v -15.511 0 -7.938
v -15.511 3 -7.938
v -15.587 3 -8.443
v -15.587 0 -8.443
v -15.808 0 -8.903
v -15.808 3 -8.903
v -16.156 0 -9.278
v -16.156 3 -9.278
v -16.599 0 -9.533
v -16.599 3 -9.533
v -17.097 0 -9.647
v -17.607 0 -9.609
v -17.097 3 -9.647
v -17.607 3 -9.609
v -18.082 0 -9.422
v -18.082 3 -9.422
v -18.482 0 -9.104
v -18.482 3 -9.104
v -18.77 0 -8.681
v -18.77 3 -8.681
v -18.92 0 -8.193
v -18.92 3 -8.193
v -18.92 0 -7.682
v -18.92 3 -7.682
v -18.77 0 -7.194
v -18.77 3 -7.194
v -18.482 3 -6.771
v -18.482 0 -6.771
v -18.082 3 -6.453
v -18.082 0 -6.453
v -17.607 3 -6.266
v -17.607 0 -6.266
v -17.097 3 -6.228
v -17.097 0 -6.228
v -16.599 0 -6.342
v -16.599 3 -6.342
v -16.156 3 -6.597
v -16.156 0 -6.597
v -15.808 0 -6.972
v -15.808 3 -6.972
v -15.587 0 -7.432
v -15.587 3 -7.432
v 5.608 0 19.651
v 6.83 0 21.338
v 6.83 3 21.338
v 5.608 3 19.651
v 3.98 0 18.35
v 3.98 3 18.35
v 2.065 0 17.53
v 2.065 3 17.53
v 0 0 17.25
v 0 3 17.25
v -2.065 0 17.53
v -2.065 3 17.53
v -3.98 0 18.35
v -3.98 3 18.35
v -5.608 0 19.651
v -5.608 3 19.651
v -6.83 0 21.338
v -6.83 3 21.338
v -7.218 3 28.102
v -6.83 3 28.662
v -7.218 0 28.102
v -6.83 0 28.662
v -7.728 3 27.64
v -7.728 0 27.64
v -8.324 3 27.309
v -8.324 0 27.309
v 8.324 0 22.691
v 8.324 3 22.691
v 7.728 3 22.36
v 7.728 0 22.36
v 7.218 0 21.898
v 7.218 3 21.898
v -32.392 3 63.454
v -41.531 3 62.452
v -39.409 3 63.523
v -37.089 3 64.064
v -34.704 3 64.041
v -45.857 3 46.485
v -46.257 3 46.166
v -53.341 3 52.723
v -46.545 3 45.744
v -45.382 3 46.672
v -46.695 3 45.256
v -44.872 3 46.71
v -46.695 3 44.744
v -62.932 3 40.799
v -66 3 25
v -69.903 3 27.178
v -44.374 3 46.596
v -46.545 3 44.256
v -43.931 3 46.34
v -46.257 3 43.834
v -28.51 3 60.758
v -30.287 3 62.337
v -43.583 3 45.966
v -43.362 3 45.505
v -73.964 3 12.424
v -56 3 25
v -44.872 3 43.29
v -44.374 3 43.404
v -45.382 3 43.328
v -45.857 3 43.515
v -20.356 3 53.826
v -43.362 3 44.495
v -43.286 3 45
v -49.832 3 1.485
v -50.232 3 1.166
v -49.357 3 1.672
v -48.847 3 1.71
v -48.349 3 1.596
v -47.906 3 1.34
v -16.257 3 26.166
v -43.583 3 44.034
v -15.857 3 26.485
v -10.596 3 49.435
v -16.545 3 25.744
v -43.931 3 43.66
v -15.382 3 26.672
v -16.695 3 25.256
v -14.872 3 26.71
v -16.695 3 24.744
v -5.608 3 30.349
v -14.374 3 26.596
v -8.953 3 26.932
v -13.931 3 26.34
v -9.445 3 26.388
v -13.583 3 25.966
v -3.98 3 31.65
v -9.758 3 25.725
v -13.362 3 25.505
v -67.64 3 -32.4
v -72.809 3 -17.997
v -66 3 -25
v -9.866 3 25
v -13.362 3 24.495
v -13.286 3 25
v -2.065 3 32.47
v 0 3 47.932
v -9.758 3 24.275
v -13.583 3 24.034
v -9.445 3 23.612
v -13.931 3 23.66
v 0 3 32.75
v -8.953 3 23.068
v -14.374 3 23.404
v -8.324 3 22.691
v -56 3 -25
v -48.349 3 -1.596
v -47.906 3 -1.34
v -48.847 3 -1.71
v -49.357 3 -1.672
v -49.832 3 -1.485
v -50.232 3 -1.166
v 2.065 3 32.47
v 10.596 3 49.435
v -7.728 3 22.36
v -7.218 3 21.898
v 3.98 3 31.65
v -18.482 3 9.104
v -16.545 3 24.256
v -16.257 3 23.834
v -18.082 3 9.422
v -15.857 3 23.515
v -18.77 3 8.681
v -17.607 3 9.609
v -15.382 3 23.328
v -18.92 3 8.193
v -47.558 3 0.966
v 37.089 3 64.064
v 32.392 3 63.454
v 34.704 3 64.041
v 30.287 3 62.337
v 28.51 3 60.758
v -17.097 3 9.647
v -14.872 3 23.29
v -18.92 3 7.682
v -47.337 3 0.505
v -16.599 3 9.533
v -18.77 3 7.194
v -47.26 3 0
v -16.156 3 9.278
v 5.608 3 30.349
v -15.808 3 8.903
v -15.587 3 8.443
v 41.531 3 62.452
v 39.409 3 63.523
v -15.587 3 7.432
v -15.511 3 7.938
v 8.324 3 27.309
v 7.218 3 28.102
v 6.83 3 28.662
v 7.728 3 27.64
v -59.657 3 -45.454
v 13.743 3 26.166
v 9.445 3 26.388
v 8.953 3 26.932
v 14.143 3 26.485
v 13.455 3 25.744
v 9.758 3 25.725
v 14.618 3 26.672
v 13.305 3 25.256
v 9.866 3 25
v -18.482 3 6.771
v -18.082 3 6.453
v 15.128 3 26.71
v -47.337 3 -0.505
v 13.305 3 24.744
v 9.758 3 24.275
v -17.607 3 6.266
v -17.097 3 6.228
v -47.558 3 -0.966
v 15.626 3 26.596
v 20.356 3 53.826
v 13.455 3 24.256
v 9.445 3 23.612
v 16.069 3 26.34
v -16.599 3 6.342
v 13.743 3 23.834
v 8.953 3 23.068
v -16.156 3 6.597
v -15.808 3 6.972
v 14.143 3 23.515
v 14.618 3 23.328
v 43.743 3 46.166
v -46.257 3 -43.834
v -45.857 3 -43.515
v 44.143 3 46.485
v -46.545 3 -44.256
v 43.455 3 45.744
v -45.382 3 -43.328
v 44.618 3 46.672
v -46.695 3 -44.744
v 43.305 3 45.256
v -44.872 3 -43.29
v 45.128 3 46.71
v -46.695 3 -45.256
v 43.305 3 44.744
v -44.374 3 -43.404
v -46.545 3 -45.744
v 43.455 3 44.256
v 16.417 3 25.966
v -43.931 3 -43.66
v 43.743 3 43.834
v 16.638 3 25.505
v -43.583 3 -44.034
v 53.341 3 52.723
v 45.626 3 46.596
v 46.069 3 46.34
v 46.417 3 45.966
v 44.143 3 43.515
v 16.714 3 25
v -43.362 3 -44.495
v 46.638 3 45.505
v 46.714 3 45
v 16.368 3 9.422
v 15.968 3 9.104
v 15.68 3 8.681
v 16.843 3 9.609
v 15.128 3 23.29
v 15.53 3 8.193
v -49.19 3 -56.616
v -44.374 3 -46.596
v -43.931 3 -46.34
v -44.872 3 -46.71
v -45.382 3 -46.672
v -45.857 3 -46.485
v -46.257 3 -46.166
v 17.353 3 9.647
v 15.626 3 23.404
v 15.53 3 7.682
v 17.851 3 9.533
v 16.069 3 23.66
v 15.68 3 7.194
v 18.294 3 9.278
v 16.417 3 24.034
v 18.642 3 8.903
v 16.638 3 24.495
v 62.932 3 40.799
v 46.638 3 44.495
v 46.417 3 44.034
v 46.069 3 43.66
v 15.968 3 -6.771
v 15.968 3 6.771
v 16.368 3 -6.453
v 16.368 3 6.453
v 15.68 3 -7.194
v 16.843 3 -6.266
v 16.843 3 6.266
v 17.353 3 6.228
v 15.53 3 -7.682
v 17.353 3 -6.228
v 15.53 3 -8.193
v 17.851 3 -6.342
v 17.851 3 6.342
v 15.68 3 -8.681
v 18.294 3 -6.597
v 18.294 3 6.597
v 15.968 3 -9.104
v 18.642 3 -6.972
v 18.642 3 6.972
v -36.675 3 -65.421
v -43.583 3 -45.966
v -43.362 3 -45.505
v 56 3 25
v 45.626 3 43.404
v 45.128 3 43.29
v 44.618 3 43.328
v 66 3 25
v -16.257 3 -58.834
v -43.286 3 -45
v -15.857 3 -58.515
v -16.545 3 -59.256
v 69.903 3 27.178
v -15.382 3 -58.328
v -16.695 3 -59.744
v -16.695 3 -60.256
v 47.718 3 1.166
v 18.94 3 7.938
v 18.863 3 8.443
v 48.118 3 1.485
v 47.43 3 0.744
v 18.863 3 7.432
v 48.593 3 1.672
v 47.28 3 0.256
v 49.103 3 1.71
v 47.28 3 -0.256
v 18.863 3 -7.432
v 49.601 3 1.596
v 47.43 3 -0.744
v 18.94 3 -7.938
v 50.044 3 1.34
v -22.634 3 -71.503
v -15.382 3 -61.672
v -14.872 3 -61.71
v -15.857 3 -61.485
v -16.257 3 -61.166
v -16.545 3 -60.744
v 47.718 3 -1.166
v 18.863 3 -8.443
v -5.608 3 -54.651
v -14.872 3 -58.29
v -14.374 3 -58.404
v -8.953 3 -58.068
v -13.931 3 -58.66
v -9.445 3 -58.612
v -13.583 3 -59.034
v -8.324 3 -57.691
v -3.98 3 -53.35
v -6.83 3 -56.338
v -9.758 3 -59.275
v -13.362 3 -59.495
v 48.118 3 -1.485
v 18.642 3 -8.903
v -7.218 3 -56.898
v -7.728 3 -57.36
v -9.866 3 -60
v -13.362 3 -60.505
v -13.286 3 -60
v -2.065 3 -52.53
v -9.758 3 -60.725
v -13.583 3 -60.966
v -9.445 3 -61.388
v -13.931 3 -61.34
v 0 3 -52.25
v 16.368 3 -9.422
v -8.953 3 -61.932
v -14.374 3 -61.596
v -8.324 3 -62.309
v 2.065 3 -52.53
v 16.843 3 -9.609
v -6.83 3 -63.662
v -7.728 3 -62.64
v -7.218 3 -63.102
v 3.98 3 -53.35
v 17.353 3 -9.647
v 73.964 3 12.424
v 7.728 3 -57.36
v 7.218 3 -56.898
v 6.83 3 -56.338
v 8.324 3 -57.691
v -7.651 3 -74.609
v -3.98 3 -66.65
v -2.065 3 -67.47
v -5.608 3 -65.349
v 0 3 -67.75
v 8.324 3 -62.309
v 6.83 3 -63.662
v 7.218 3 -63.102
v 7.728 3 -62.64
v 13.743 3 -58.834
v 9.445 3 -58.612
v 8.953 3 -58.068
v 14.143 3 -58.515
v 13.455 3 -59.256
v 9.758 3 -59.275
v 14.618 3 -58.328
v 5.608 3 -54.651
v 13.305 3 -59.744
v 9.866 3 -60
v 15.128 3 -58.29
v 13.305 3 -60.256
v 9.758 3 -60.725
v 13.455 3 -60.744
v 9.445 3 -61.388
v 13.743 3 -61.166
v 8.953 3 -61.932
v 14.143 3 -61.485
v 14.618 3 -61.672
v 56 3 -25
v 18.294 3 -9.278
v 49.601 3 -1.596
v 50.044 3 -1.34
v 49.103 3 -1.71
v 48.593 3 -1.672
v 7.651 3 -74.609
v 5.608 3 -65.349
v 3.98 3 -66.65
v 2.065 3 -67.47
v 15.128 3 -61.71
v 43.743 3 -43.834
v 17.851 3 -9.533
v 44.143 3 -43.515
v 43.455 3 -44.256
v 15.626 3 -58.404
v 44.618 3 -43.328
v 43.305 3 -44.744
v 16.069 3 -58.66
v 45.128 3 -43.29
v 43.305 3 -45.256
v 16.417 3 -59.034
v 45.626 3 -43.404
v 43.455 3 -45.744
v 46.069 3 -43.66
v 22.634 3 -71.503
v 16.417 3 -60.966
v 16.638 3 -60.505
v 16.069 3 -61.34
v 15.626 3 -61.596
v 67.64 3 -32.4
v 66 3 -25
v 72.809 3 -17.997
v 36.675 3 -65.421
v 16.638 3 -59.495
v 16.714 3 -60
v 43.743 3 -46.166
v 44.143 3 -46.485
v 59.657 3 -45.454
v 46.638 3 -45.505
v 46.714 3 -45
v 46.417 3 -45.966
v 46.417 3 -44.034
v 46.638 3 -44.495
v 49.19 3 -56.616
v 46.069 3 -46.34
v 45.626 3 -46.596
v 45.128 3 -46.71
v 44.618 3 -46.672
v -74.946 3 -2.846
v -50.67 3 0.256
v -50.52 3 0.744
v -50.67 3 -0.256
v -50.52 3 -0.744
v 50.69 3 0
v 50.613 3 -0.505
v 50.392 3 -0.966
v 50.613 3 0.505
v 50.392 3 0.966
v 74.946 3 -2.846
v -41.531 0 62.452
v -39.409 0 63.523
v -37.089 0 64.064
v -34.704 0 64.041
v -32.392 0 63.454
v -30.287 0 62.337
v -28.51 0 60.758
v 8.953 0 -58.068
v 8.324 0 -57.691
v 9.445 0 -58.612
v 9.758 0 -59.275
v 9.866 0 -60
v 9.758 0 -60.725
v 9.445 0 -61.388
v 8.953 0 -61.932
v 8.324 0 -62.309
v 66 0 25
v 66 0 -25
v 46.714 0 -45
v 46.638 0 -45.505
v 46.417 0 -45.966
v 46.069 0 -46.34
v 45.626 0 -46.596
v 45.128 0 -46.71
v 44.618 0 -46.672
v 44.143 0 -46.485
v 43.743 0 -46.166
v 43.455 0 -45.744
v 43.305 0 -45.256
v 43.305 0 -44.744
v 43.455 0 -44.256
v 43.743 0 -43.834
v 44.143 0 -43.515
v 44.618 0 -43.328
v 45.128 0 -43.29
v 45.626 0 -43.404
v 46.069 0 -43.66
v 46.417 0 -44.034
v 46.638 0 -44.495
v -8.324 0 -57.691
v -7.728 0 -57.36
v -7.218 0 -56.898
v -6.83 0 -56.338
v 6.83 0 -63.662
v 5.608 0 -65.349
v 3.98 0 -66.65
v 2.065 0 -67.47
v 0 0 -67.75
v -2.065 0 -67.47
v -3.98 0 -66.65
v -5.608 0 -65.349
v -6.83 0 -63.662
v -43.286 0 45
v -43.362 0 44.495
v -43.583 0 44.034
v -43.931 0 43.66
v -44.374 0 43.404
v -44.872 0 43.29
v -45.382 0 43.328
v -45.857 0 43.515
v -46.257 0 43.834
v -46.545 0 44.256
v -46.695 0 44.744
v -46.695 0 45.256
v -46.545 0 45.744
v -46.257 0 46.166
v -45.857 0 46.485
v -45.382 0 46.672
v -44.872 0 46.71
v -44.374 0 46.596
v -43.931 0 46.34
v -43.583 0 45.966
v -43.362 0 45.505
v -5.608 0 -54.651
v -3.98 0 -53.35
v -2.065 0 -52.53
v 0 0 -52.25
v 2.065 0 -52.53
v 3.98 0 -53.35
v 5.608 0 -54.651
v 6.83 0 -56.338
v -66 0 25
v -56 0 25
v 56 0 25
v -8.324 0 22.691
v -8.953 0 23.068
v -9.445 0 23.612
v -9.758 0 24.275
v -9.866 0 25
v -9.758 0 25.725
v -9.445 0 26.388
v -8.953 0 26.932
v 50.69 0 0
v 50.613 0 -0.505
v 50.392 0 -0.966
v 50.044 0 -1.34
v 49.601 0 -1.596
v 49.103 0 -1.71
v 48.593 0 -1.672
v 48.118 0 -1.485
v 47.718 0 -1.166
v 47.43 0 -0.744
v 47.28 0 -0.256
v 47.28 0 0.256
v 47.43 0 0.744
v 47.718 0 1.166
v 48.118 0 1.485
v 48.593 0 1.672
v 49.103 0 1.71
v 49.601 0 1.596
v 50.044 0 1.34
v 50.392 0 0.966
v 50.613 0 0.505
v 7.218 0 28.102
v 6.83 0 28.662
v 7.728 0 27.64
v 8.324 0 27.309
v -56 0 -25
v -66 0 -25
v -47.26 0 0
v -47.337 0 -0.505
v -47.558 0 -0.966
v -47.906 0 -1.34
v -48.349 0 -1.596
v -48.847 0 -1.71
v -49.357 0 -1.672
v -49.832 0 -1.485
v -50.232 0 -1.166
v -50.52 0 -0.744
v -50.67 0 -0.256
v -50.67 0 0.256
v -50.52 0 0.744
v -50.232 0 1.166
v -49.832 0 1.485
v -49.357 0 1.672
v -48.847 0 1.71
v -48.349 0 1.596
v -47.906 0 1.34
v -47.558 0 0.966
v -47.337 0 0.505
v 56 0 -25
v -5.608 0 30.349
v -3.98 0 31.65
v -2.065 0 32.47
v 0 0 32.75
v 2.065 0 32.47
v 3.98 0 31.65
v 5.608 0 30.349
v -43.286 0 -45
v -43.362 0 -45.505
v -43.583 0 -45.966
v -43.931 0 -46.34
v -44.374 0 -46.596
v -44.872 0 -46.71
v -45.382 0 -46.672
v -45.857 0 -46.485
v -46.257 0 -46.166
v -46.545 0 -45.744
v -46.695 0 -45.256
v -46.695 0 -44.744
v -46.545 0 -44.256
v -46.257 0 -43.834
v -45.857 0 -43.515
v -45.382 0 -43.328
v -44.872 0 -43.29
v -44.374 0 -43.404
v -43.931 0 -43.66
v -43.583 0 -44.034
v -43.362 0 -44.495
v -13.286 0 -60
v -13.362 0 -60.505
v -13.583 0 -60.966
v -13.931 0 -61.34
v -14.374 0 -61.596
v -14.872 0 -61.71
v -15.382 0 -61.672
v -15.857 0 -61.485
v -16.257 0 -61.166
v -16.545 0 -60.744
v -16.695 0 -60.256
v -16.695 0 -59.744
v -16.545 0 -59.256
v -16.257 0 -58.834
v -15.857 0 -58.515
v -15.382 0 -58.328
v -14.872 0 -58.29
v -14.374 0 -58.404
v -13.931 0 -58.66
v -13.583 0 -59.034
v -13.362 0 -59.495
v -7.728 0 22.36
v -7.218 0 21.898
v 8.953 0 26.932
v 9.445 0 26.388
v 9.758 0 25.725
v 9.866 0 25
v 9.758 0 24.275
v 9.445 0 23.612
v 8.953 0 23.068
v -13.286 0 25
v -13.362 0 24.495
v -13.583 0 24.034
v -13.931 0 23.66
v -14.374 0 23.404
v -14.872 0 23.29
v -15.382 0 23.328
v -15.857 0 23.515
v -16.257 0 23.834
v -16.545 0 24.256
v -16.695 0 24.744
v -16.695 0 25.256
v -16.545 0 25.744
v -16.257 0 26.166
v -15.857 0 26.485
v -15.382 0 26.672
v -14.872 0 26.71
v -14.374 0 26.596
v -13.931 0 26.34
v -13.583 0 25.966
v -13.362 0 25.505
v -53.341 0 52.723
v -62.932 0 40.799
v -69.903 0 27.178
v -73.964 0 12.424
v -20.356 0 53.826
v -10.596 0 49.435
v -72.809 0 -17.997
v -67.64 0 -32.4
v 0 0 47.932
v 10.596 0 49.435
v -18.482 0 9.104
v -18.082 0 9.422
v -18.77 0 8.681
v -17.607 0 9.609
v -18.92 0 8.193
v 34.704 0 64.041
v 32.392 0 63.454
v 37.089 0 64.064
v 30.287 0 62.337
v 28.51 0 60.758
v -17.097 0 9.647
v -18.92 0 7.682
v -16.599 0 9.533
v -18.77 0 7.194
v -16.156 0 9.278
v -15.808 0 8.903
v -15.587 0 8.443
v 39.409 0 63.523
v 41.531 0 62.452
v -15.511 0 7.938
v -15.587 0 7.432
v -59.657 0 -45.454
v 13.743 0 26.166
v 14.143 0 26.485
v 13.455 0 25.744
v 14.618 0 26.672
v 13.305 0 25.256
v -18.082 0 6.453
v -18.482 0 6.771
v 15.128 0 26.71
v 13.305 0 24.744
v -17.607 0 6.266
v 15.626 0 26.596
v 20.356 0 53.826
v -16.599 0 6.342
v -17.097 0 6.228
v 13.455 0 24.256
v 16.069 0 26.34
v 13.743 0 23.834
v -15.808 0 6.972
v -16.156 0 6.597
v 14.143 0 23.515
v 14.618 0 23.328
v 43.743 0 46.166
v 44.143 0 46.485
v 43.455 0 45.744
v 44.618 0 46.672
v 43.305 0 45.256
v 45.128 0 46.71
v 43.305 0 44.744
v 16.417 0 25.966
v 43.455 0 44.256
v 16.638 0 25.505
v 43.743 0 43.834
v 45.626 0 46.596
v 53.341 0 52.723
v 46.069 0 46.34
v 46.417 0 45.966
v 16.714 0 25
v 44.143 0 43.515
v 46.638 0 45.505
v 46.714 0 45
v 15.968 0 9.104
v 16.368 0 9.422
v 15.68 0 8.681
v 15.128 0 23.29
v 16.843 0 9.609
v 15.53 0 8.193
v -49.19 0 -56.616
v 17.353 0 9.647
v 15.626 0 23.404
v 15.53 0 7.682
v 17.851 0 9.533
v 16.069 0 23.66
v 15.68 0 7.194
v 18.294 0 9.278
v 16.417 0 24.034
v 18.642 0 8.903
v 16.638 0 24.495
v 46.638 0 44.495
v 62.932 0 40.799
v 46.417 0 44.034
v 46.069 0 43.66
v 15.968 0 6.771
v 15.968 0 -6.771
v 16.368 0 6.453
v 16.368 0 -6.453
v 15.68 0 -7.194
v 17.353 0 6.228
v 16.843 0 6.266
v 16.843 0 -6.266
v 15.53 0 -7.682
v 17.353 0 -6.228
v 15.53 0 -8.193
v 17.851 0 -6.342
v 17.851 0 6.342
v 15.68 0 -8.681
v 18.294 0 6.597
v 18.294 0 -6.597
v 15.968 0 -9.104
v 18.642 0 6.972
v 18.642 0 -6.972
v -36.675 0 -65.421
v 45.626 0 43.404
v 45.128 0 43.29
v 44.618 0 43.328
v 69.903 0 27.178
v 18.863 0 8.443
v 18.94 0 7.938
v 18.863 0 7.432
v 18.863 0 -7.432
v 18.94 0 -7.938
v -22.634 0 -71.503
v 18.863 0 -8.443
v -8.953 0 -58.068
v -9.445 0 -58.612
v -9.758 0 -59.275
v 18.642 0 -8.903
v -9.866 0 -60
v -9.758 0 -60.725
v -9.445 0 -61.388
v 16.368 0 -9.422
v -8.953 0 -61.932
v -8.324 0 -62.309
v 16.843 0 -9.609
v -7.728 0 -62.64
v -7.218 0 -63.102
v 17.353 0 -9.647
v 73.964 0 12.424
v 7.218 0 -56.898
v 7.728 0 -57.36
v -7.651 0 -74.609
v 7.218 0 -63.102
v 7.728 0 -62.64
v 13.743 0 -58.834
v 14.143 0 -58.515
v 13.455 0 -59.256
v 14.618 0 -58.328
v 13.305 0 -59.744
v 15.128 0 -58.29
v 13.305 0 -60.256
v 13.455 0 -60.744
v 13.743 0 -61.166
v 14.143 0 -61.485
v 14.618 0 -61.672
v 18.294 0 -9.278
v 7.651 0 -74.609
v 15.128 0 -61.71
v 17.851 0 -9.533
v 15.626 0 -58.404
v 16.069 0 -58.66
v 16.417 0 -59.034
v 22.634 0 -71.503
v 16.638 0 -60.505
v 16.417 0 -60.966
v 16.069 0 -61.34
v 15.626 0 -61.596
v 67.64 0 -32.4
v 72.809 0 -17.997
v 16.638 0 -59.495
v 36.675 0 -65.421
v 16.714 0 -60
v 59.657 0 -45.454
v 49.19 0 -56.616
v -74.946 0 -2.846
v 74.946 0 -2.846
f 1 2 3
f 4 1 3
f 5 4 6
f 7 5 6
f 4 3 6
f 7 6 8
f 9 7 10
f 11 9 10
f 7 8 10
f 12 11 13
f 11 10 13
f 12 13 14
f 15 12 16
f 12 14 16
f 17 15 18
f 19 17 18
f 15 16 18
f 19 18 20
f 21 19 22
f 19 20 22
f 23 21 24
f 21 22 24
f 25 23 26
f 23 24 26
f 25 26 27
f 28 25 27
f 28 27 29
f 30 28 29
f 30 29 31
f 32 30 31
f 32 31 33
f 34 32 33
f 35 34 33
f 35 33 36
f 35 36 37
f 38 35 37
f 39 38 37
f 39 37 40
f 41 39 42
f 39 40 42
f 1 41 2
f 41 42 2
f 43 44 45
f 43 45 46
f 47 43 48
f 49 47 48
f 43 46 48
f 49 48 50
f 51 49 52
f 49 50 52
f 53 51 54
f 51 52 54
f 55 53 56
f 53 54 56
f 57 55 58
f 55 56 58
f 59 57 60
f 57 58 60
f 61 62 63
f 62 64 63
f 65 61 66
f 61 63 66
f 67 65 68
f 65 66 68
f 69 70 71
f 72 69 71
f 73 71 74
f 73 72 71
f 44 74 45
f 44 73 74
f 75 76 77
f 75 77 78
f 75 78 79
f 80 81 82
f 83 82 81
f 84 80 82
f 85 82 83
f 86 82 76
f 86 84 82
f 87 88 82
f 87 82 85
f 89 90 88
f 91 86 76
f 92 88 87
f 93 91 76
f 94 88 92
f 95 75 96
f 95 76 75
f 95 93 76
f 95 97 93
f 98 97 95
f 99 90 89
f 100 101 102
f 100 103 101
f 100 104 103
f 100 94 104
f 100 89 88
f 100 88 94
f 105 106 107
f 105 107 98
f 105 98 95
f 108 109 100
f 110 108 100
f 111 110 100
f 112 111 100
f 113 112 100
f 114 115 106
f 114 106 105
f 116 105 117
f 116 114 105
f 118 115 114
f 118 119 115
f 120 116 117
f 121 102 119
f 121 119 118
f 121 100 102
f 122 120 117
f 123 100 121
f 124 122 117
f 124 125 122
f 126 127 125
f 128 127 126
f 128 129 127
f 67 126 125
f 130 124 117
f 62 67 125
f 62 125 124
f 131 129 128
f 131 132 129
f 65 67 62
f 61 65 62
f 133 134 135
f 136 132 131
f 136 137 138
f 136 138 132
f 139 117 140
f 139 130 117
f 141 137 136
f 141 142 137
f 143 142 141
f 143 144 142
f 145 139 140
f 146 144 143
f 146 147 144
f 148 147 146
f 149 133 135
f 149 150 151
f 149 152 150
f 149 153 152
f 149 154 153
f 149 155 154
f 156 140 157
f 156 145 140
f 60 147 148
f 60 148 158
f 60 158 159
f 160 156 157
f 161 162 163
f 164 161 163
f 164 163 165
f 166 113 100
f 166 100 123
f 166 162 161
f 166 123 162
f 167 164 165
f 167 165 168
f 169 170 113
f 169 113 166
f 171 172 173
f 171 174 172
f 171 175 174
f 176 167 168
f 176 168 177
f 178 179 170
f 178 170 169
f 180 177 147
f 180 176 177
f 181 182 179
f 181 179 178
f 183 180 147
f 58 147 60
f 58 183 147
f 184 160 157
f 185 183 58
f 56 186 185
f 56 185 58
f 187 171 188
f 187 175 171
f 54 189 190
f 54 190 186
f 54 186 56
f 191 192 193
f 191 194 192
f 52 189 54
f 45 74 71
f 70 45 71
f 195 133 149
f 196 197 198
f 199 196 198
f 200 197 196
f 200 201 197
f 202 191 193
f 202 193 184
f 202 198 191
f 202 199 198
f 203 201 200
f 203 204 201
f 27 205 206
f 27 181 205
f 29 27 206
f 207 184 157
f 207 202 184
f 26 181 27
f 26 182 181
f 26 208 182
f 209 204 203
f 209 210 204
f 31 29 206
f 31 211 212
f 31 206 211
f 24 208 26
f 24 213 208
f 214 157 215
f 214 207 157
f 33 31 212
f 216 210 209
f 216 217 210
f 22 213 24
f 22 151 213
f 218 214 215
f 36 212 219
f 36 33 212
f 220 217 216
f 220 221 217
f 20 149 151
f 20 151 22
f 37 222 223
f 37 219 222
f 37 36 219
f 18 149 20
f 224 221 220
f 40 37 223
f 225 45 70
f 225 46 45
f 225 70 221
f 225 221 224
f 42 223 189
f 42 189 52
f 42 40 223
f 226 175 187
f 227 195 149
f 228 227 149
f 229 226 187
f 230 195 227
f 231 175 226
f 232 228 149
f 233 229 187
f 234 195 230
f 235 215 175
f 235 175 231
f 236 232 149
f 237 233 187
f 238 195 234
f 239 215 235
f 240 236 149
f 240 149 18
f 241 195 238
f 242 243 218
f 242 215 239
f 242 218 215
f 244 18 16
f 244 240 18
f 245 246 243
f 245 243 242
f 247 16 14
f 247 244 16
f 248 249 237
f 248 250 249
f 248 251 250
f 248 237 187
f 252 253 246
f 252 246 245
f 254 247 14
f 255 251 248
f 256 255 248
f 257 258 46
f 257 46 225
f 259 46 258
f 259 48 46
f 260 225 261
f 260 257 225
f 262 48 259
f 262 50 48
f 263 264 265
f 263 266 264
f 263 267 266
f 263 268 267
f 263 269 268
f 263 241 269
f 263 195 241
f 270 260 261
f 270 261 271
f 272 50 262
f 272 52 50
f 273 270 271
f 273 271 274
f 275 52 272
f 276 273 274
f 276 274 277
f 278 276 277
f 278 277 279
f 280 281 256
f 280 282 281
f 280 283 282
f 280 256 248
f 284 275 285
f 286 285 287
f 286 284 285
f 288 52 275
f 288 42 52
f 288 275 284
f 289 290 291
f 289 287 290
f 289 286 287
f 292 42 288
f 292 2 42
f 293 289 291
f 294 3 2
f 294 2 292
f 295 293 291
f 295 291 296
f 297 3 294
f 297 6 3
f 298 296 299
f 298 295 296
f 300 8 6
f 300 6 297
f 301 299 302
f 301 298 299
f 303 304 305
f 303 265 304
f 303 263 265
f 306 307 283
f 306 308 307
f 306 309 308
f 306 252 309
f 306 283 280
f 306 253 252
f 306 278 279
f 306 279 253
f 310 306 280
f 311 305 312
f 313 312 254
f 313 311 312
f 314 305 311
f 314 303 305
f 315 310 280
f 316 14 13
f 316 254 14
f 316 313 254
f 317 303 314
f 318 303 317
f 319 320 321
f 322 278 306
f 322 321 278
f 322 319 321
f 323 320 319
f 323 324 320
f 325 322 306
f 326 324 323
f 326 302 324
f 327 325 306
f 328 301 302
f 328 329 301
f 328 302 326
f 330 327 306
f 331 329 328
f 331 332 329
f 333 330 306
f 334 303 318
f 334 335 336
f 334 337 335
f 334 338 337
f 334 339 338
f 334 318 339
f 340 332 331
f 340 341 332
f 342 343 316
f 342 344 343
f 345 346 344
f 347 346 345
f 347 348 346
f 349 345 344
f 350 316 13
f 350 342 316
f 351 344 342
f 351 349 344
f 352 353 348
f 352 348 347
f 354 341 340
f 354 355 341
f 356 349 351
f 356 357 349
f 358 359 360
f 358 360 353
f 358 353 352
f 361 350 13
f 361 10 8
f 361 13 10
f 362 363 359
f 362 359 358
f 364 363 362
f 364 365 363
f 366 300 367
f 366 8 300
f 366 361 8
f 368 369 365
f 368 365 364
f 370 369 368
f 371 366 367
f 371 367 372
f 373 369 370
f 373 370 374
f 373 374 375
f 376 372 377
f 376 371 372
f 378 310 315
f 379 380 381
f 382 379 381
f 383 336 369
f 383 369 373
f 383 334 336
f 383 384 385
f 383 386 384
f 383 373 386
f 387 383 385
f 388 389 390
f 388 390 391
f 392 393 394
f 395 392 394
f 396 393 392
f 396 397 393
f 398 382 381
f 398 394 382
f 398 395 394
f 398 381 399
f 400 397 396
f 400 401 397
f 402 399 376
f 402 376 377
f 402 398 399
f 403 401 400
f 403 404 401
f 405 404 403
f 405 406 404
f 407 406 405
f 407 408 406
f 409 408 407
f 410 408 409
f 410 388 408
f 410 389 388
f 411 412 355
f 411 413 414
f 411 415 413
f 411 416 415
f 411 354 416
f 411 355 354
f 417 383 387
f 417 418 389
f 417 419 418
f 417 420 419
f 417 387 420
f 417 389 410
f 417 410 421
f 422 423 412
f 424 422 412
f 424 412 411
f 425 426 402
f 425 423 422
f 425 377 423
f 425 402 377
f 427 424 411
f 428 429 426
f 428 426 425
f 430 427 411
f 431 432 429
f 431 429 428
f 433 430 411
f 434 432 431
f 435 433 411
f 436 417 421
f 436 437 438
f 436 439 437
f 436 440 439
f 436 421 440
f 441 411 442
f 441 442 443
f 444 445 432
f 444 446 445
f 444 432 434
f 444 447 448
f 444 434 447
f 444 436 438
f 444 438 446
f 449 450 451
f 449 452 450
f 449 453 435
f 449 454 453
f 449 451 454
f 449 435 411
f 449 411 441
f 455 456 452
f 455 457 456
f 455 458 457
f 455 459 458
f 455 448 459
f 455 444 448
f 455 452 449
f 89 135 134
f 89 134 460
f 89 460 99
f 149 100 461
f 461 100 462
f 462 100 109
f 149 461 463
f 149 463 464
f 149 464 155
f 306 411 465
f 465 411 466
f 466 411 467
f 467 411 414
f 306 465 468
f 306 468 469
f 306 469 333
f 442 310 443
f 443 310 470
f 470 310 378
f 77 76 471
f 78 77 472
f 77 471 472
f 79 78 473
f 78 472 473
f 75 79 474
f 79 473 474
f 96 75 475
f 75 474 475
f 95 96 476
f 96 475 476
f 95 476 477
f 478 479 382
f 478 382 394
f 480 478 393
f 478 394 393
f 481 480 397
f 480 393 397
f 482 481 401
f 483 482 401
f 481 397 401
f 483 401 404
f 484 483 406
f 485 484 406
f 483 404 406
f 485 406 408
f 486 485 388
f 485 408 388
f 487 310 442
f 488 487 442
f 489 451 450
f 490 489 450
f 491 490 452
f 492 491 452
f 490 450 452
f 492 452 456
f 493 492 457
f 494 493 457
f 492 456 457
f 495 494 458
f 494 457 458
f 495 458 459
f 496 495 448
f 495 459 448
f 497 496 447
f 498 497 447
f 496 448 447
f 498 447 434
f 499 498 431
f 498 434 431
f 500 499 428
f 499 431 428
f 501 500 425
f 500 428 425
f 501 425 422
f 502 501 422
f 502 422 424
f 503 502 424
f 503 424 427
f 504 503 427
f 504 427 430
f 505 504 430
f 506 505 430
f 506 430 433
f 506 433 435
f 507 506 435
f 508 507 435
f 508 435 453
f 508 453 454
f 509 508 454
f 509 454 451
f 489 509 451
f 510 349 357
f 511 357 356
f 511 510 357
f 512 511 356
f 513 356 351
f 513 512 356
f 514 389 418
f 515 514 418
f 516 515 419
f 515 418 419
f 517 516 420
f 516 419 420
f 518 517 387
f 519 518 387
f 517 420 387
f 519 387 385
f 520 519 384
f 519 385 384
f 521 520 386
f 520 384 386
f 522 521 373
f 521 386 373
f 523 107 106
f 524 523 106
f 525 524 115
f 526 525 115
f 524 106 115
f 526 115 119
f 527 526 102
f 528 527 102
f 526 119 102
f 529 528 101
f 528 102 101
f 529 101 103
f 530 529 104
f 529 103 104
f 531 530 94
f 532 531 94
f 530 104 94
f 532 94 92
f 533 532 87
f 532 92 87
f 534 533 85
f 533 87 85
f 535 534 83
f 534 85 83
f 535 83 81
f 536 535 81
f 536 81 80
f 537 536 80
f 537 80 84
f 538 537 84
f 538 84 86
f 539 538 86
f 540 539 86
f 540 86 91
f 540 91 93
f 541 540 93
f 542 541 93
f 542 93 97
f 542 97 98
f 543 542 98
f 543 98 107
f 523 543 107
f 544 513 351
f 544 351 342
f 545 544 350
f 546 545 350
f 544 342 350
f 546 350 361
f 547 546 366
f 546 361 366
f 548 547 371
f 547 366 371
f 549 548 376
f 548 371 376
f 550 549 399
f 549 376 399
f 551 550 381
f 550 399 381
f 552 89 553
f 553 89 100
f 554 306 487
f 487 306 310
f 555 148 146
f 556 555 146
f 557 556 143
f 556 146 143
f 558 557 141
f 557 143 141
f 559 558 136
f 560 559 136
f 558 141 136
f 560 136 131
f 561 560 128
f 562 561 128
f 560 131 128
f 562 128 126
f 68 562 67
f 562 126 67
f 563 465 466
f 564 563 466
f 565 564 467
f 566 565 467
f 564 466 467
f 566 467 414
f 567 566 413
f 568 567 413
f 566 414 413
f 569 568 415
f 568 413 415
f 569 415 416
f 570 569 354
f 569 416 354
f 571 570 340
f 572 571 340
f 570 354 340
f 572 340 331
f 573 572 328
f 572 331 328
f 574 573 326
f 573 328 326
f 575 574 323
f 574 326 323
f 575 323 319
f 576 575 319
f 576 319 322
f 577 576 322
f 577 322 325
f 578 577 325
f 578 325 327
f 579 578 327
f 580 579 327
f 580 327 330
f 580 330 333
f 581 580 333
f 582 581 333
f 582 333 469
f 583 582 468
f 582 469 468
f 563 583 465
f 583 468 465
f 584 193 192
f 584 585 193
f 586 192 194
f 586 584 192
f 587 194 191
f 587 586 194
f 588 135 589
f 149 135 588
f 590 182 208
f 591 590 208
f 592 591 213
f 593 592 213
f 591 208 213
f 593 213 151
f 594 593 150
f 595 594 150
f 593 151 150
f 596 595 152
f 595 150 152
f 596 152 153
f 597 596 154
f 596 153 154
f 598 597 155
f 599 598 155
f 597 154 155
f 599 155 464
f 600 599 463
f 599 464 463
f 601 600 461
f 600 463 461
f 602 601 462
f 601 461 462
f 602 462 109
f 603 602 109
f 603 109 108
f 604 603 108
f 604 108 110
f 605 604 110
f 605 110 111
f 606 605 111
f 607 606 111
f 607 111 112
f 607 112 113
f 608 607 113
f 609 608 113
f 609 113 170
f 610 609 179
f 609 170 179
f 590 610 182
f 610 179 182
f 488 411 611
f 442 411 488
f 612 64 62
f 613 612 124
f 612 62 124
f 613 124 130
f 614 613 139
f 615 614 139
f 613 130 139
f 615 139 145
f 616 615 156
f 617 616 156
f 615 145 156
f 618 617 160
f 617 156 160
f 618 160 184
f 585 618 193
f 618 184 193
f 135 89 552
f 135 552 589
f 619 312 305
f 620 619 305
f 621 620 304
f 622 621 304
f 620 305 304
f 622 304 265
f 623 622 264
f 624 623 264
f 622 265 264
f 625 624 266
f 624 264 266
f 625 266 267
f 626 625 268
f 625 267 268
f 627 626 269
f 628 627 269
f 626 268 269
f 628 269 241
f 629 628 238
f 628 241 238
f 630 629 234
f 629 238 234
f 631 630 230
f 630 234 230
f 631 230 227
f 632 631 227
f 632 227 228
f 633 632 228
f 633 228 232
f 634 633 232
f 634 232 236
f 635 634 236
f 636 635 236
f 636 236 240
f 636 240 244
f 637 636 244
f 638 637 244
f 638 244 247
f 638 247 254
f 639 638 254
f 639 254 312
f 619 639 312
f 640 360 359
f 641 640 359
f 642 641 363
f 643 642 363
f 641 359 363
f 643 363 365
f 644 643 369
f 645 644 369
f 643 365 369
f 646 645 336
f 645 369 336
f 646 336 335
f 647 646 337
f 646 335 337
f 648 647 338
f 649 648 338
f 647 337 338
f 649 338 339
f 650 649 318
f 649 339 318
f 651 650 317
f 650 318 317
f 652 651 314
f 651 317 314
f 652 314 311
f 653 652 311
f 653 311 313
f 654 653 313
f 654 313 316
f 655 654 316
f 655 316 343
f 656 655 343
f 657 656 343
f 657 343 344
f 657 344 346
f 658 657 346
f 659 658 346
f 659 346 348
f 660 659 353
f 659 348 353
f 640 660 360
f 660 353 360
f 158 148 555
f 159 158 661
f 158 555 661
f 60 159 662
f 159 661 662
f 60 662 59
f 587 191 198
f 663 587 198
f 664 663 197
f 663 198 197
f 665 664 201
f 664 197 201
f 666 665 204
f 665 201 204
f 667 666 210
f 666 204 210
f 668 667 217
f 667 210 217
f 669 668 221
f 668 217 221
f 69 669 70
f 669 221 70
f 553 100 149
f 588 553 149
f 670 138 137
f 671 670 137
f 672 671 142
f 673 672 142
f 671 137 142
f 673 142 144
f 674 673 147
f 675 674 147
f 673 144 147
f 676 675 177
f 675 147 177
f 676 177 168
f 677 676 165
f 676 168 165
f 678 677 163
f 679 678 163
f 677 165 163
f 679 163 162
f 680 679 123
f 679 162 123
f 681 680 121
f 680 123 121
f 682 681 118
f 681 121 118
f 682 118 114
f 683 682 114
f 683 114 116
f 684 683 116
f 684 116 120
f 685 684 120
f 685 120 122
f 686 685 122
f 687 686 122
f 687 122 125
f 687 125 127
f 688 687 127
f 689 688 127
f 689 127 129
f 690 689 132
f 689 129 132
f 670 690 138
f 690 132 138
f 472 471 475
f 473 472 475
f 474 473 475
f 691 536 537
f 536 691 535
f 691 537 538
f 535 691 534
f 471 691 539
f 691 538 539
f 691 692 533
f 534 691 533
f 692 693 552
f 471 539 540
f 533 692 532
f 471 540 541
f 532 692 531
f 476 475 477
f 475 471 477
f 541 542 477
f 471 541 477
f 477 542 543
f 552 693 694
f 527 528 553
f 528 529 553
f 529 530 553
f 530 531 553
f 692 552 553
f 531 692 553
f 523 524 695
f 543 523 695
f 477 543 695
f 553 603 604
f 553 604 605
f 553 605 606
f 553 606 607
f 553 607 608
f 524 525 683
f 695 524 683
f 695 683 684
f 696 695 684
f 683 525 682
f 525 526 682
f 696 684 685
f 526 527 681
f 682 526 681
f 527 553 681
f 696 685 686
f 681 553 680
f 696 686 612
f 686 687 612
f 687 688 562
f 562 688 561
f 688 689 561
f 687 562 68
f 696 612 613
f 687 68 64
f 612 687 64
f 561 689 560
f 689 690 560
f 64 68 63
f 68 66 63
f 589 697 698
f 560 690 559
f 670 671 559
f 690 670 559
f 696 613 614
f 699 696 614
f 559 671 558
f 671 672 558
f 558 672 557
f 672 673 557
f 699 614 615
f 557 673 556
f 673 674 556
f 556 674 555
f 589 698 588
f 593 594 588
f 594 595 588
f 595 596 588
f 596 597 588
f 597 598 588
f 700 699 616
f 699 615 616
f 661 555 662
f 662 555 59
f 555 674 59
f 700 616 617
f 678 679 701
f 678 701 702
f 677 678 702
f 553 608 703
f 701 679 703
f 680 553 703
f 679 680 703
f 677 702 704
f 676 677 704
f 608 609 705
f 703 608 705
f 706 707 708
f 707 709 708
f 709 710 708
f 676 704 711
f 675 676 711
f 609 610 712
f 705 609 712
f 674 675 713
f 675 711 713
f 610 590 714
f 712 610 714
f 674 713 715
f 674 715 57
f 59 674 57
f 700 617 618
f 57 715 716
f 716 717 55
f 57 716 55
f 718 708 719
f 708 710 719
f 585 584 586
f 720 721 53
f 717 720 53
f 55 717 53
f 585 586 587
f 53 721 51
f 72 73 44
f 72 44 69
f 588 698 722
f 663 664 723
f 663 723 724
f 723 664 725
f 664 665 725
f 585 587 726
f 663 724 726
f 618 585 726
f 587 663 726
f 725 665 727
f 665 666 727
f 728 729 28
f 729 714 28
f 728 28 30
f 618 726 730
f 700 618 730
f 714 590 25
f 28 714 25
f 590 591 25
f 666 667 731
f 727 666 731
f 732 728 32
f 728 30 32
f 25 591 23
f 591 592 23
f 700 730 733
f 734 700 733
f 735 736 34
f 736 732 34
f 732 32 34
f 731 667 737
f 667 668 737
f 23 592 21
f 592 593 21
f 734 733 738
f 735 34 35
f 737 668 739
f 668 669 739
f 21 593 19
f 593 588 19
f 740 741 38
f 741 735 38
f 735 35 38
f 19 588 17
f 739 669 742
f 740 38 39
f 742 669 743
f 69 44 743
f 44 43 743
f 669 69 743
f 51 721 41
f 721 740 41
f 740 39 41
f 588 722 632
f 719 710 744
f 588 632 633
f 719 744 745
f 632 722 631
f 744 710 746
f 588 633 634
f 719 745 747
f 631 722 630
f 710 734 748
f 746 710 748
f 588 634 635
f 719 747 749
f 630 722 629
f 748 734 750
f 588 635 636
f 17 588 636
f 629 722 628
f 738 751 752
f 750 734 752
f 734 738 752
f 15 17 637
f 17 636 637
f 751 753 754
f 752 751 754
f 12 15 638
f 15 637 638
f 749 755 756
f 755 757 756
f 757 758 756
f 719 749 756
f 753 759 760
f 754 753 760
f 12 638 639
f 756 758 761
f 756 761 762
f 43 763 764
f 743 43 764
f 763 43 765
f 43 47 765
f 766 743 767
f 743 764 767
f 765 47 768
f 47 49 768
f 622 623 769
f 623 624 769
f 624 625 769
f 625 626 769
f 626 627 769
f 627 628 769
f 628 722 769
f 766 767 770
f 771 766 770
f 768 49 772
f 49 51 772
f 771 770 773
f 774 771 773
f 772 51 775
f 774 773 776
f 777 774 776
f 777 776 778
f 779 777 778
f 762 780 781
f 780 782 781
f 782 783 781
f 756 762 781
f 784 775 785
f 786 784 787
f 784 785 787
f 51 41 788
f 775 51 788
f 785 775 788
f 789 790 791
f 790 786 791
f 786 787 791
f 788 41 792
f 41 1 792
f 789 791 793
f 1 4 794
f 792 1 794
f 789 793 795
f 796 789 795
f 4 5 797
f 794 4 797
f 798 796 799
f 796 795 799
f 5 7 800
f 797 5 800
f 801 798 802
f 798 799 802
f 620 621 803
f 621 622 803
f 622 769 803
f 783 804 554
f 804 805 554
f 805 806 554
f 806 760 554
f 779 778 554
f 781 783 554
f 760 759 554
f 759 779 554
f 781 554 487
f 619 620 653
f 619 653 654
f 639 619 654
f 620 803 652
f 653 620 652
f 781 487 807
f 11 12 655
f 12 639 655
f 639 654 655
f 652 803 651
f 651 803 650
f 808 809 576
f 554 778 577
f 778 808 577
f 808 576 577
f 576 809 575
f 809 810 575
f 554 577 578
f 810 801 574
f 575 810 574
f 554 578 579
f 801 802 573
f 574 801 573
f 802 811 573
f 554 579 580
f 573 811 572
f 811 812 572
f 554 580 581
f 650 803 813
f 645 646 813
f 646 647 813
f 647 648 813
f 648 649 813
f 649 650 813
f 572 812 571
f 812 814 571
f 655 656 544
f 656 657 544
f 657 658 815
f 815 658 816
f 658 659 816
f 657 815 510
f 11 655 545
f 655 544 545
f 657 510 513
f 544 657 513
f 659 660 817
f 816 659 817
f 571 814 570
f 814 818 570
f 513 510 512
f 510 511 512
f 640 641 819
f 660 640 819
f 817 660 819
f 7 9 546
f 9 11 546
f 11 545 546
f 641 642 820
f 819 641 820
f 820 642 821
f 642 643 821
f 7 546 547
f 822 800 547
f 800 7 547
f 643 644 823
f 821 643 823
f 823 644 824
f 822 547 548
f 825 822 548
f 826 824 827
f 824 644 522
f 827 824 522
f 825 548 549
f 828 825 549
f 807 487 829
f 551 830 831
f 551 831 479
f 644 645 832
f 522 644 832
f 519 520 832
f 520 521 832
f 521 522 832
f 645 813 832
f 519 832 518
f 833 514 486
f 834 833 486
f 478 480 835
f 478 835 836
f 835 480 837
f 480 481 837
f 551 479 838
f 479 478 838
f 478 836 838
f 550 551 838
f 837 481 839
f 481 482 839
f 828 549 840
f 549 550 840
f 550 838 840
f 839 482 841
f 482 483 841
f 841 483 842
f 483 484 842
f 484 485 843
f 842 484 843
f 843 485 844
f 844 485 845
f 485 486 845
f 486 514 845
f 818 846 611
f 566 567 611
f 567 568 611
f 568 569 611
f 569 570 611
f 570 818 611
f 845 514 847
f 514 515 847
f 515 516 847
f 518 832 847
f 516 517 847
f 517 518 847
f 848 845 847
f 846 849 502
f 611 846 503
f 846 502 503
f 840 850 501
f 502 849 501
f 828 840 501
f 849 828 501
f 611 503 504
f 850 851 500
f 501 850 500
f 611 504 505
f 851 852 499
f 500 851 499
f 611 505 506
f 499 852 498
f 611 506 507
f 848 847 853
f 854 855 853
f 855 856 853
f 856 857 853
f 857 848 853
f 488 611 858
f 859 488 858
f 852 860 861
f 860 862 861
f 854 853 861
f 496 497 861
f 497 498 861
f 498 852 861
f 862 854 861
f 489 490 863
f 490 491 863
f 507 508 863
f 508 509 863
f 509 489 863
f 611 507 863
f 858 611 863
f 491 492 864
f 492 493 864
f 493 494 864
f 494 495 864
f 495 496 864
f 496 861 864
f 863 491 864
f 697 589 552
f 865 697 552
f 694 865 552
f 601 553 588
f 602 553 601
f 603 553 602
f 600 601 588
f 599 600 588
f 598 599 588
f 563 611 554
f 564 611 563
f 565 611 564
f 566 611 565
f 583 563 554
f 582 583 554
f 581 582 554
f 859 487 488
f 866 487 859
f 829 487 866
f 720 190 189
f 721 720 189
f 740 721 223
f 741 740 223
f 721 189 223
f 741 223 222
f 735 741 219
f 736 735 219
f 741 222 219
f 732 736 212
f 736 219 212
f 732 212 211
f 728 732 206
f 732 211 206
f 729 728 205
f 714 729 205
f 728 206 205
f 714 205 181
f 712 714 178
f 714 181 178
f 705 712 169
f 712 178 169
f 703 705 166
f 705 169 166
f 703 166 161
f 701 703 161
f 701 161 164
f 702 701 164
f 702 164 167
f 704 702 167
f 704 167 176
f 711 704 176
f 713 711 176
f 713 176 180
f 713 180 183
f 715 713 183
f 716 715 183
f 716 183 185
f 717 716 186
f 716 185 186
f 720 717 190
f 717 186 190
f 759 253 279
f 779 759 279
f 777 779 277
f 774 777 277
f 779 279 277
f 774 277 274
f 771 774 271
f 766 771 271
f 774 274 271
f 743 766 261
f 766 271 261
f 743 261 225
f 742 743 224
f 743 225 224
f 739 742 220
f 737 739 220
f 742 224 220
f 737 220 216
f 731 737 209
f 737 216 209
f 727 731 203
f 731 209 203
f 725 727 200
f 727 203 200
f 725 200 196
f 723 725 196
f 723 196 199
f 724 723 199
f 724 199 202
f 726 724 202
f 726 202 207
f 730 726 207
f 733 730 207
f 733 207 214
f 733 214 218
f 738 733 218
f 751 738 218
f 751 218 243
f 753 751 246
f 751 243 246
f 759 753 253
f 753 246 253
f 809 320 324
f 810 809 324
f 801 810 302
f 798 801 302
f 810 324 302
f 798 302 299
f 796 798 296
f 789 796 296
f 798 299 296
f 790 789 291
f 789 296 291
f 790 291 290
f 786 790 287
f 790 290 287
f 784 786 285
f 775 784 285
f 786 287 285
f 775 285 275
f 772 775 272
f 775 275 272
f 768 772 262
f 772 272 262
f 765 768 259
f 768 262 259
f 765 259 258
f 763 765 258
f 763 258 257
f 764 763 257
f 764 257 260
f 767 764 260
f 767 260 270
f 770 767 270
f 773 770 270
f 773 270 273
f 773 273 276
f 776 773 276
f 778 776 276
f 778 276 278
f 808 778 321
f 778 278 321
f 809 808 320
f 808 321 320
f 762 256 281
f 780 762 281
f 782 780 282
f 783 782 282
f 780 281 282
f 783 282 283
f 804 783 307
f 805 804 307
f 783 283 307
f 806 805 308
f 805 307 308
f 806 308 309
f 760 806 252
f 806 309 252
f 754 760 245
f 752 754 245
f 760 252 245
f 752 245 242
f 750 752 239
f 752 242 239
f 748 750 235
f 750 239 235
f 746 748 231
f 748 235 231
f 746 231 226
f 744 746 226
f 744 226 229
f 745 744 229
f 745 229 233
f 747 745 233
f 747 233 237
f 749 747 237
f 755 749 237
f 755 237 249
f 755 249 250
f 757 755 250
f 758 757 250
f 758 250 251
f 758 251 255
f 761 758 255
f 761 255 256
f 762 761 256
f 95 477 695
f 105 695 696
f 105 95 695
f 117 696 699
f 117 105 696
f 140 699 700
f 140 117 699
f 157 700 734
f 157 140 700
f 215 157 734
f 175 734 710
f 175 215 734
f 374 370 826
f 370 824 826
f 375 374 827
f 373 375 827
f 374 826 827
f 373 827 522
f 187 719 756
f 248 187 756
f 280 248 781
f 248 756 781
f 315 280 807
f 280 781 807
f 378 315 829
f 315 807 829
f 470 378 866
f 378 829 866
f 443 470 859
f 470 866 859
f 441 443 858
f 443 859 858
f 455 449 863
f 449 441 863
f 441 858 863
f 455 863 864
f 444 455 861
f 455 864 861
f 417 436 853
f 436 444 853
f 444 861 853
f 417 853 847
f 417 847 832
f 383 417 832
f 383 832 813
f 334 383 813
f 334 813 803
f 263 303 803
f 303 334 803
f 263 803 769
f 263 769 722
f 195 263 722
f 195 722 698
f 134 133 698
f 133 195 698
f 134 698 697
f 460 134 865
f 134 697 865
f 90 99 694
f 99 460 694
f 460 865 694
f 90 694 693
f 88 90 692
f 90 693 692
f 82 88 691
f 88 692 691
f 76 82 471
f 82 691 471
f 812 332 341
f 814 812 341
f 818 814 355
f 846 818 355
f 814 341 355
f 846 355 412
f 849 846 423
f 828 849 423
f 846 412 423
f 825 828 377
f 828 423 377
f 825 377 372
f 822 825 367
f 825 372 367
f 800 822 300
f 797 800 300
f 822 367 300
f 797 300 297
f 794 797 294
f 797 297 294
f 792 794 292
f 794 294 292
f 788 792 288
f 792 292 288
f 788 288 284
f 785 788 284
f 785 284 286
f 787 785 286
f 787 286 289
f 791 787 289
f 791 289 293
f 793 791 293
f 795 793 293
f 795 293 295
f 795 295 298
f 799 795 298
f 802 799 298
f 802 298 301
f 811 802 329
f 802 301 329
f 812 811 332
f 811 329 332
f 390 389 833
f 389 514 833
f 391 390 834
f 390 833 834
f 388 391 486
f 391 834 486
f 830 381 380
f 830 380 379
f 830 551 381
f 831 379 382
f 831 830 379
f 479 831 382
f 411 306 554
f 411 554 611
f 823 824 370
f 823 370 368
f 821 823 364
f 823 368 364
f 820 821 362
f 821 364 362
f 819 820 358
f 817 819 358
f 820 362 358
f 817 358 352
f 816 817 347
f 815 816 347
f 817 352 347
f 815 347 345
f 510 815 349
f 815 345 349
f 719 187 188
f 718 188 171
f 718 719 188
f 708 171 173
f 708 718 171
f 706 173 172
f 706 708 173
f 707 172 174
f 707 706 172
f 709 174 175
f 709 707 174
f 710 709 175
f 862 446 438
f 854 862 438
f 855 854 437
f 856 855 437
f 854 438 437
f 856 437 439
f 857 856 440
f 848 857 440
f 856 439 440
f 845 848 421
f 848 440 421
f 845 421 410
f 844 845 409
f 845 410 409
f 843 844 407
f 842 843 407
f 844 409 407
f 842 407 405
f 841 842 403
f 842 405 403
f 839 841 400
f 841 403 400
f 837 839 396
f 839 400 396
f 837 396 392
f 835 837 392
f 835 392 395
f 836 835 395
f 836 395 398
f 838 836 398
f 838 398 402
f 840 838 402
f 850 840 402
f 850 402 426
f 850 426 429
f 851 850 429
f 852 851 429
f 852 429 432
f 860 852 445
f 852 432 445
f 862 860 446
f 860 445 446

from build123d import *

# Parameters (mm, degrees)
SKETCH1_R           = 75
BOSS_EXTRUDE1_DEPTH = 3
SKETCH2_W           = 10
SKETCH2_H           = 50
CUT_EXTRUDE1_DEPTH  = 6.35
CUT_EXTRUDE2_DEPTH  = 10
CUT_EXTRUDE3_START  = -10
CUT_EXTRUDE3_DEPTH  = 10
FILLET2_R           = 10
SKETCH7_R           = 1.7145
CUT_EXTRUDE5_DEPTH  = 3
SKETCH6_R           = 1.7145
CUT_EXTRUDE6_DEPTH  = 3
FILLET4_R           = 3
SKETCH8_R           = 1.7145
CUT_EXTRUDE7_DEPTH  = 107.108435247


with BuildPart() as part:
    # Sketch1 → Boss-Extrude1 (new body)
    with BuildSketch(Plane(origin=(0, 0, 0), x_dir=(1, 0, 0), z_dir=(0, 1, 0))):
        Circle(SKETCH1_R)
    extrude(amount=BOSS_EXTRUDE1_DEPTH)

    # Sketch2 → Cut-Extrude1 (cut)
    with BuildSketch(Plane(origin=(0, 3, 0), x_dir=(1, 0, 0), z_dir=(0, 1, 0))):
        with Locations((-61, 0)):
            Rectangle(SKETCH2_W, SKETCH2_H)
        with Locations((61, 0)):
            Rectangle(SKETCH2_W, SKETCH2_H)
    extrude(amount=-CUT_EXTRUDE1_DEPTH, mode=Mode.SUBTRACT)

    # Sketch3 → Cut-Extrude2 (cut)
    with BuildSketch(Plane(origin=(0, 3, 0), x_dir=(1, 0, 0), z_dir=(0, 1, 0))):
        with BuildLine():
            ThreePointArc((-7.335762693, -27.499817134), (0, -32.75), (7.335762693, -27.499817134))
            ThreePointArc((7.335762693, -27.499817134), (9.866, -25), (7.335762693, -22.500182866))
            ThreePointArc((7.335762693, -22.500182866), (0, -17.25), (-7.335762693, -22.500182866))
            ThreePointArc((-7.335762693, -22.500182866), (-9.866, -25), (-7.335762693, -27.499817134))
        make_face()
        with BuildLine():
            ThreePointArc((-7.335762693, 62.499817134), (-9.866, 60), (-7.335762693, 57.500182866))
            ThreePointArc((-7.335762693, 57.500182866), (0, 52.25), (7.335762693, 57.500182866))
            ThreePointArc((7.335762693, 57.500182866), (9.866, 60), (7.335762693, 62.499817134))
            ThreePointArc((7.335762693, 62.499817134), (0, 67.75), (-7.335762693, 62.499817134))
        make_face()
    extrude(amount=-CUT_EXTRUDE2_DEPTH, mode=Mode.SUBTRACT)

    # Sketch4 → Cut-Extrude3 (cut)
    with BuildSketch(Plane(origin=(0, 3, 0), x_dir=(1, 0, 0), z_dir=(0, 1, 0)).offset(CUT_EXTRUDE3_START)):
        with BuildLine():
            ThreePointArc((-33.160552015, -67.270928268), (0, -47.932265908), (33.160552015, -67.270928268))
            ThreePointArc((33.160552015, -67.270928268), (0, -75), (-33.160552015, -67.270928268))
        make_face()
    extrude(amount=CUT_EXTRUDE3_DEPTH, mode=Mode.SUBTRACT)

    # Fillet2
    fillet2_edges = [part.edges().sort_by_distance(p)[0] for p in [
        (33.160552015, 1.5, 67.270928268),
        (-33.160552015, 1.5, 67.270928268),
    ]]
    fillet(fillet2_edges, radius=FILLET2_R)

    # Sketch7 → Cut-Extrude5 (cut)
    with BuildSketch(Plane(origin=(0, 3, 0), x_dir=(1, 0, 0), z_dir=(0, 1, 0))):
        with Locations((-48.975, 0)):
            Circle(SKETCH7_R)
        with Locations((-17.225, -7.9375)):
            Circle(SKETCH7_R)
        with Locations((-17.225, 7.9375)):
            Circle(SKETCH7_R)
        with Locations((17.225, 7.9375)):
            Circle(SKETCH7_R)
        with Locations((17.225, -7.9375)):
            Circle(SKETCH7_R)
        with Locations((48.975, 0)):
            Circle(SKETCH7_R)
    extrude(amount=-CUT_EXTRUDE5_DEPTH, mode=Mode.SUBTRACT)

    # Sketch6 → Cut-Extrude6 (cut)
    with BuildSketch(Plane(origin=(0, 3, 0), x_dir=(1, 0, 0), z_dir=(0, 1, 0))):
        with Locations((-15, 60)):
            Circle(SKETCH6_R)
        with Locations((15, 60)):
            Circle(SKETCH6_R)
        with Locations((-15, -25)):
            Circle(SKETCH6_R)
        with Locations((15, -25)):
            Circle(SKETCH6_R)
    extrude(amount=-CUT_EXTRUDE6_DEPTH, mode=Mode.SUBTRACT)

    # Fillet4
    fillet4_edges = [part.edges().sort_by_distance(p)[0] for p in [
        (-7.335762693, 1.5, -57.500182866),
        (7.335762693, 1.5, -57.500182866),
        (7.335762693, 1.5, -62.499817134),
        (-7.335762693, 1.5, -62.499817134),
        (7.335762693, 1.5, 22.500182866),
        (-7.335762693, 1.5, 22.500182866),
        (7.335762693, 1.5, 27.499817134),
        (-7.335762693, 1.5, 27.499817134),
    ]]
    fillet(fillet4_edges, radius=FILLET4_R)

    # Sketch8 → Cut-Extrude7 (cut, through all)
    with BuildSketch(Plane(origin=(0, 3, 0), x_dir=(1, 0, 0), z_dir=(0, 1, 0))):
        with Locations((-45, 45)):
            Circle(SKETCH8_R)
        with Locations((45, 45)):
            Circle(SKETCH8_R)
        with Locations((45, -45)):
            Circle(SKETCH8_R)
        with Locations((-45, -45)):
            Circle(SKETCH8_R)
    extrude(amount=-CUT_EXTRUDE7_DEPTH, mode=Mode.SUBTRACT)


solid = part.part
